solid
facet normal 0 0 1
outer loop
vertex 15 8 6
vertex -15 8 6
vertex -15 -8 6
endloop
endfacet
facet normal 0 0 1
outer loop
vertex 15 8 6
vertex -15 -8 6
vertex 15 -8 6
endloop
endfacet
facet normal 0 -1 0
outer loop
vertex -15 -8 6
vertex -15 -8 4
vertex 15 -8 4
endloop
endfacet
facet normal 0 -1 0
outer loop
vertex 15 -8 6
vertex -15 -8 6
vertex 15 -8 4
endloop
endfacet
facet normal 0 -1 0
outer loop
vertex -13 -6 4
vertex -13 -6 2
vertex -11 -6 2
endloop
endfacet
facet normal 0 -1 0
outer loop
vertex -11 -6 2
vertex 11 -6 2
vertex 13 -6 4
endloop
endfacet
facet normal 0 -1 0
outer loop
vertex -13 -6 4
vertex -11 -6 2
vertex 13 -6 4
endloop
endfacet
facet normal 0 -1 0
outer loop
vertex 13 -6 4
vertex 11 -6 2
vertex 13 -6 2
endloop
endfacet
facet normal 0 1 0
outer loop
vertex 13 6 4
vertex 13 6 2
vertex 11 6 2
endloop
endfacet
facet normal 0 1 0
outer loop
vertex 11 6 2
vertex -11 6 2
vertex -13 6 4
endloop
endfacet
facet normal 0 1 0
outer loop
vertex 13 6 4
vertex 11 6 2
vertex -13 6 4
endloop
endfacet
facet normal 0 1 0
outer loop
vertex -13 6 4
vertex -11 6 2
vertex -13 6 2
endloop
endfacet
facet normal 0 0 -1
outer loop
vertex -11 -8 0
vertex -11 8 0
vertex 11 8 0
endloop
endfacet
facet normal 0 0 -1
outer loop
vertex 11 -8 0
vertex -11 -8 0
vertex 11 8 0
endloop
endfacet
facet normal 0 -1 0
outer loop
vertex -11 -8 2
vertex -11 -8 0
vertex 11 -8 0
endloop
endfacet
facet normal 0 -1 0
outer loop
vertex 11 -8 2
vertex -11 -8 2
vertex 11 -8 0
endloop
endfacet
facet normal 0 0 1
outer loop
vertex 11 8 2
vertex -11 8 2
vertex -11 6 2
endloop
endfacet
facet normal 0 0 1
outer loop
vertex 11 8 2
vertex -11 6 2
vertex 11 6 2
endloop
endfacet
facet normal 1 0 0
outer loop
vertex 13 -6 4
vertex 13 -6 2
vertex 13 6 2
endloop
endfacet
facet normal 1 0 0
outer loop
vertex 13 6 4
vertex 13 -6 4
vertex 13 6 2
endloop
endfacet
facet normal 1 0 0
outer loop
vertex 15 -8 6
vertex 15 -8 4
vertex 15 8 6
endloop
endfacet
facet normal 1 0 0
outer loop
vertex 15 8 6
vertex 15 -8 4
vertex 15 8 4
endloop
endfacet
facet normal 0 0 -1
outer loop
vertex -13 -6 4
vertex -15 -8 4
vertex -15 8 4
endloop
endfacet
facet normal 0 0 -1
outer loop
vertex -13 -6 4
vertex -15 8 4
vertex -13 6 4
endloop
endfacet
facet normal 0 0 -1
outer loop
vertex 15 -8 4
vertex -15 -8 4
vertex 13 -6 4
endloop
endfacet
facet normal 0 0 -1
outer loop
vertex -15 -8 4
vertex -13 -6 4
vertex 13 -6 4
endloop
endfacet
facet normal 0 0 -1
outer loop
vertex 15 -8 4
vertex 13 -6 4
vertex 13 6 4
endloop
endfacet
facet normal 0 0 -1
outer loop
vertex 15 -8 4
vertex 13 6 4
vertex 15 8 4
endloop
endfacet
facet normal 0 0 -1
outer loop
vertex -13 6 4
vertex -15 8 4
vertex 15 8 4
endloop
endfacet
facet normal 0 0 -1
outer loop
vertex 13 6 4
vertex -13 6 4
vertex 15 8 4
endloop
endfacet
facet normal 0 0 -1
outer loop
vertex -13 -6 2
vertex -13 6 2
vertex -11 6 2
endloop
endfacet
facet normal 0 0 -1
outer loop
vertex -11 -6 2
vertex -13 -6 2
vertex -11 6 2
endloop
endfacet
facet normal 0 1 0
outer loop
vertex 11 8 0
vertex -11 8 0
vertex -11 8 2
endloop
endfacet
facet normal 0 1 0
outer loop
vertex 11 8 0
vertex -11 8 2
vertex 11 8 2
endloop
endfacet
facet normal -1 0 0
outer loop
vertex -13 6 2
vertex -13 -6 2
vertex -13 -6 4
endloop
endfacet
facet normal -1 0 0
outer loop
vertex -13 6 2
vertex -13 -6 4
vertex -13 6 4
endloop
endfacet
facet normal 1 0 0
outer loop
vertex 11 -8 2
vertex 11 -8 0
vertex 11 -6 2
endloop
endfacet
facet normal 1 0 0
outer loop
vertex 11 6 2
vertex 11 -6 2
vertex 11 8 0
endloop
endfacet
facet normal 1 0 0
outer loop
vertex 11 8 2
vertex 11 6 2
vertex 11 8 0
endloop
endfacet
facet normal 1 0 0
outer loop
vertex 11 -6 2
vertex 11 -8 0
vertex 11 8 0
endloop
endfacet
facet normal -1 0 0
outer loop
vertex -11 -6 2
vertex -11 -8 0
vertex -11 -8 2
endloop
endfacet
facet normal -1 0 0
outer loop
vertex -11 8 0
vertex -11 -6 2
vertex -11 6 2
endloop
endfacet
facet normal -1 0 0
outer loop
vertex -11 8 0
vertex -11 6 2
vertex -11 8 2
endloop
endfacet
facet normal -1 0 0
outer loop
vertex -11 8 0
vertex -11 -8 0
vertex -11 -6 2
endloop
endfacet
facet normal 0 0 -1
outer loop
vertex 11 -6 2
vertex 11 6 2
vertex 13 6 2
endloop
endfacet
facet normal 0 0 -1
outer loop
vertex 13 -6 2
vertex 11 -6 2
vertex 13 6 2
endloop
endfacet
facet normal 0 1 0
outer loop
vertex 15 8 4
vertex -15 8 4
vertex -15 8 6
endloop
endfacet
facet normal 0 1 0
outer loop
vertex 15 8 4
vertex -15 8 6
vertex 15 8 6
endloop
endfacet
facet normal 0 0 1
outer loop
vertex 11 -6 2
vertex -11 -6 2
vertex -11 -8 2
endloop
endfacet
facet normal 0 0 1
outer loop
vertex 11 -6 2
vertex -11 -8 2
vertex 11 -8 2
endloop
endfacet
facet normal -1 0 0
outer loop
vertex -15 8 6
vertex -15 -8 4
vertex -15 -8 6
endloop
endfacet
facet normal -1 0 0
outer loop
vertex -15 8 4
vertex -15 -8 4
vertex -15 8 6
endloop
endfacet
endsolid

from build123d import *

# Parameters (mm, degrees)
F1_W     = 22
F1_H     = 16
F2_DEPTH = 2
F3_W     = 2
F3_H     = 12
F3_W_2   = 22
F4_DEPTH = 2
F5_W     = 30
F5_H     = 16
F5_W_2   = 26
F5_H_2   = 12
F6_DEPTH = 2


with BuildPart() as f2:
    # F1 (on Top) → F2 (new body)
    with BuildSketch(Plane.XY):
        Rectangle(F1_W, F1_H)
    extrude(amount=F2_DEPTH)

    # F3 (on face) → F4 (join)
    with BuildSketch(Plane.XY.offset(2)):
        with Locations((-12, 0)):
            Rectangle(F3_W, F3_H)
        Rectangle(F3_W_2, F3_H)
        with Locations((12, 0)):
            Rectangle(F3_W, F3_H)
    extrude(amount=F4_DEPTH)

    # F5 (on face) → F6 (join)
    with BuildSketch(Plane.XY.offset(4)):
        Rectangle(F5_W, F5_H)
        Rectangle(F5_W_2, F5_H_2, mode=Mode.SUBTRACT)
        Rectangle(F5_W_2, F5_H_2)
    extrude(amount=F6_DEPTH)


solid = f2.part
